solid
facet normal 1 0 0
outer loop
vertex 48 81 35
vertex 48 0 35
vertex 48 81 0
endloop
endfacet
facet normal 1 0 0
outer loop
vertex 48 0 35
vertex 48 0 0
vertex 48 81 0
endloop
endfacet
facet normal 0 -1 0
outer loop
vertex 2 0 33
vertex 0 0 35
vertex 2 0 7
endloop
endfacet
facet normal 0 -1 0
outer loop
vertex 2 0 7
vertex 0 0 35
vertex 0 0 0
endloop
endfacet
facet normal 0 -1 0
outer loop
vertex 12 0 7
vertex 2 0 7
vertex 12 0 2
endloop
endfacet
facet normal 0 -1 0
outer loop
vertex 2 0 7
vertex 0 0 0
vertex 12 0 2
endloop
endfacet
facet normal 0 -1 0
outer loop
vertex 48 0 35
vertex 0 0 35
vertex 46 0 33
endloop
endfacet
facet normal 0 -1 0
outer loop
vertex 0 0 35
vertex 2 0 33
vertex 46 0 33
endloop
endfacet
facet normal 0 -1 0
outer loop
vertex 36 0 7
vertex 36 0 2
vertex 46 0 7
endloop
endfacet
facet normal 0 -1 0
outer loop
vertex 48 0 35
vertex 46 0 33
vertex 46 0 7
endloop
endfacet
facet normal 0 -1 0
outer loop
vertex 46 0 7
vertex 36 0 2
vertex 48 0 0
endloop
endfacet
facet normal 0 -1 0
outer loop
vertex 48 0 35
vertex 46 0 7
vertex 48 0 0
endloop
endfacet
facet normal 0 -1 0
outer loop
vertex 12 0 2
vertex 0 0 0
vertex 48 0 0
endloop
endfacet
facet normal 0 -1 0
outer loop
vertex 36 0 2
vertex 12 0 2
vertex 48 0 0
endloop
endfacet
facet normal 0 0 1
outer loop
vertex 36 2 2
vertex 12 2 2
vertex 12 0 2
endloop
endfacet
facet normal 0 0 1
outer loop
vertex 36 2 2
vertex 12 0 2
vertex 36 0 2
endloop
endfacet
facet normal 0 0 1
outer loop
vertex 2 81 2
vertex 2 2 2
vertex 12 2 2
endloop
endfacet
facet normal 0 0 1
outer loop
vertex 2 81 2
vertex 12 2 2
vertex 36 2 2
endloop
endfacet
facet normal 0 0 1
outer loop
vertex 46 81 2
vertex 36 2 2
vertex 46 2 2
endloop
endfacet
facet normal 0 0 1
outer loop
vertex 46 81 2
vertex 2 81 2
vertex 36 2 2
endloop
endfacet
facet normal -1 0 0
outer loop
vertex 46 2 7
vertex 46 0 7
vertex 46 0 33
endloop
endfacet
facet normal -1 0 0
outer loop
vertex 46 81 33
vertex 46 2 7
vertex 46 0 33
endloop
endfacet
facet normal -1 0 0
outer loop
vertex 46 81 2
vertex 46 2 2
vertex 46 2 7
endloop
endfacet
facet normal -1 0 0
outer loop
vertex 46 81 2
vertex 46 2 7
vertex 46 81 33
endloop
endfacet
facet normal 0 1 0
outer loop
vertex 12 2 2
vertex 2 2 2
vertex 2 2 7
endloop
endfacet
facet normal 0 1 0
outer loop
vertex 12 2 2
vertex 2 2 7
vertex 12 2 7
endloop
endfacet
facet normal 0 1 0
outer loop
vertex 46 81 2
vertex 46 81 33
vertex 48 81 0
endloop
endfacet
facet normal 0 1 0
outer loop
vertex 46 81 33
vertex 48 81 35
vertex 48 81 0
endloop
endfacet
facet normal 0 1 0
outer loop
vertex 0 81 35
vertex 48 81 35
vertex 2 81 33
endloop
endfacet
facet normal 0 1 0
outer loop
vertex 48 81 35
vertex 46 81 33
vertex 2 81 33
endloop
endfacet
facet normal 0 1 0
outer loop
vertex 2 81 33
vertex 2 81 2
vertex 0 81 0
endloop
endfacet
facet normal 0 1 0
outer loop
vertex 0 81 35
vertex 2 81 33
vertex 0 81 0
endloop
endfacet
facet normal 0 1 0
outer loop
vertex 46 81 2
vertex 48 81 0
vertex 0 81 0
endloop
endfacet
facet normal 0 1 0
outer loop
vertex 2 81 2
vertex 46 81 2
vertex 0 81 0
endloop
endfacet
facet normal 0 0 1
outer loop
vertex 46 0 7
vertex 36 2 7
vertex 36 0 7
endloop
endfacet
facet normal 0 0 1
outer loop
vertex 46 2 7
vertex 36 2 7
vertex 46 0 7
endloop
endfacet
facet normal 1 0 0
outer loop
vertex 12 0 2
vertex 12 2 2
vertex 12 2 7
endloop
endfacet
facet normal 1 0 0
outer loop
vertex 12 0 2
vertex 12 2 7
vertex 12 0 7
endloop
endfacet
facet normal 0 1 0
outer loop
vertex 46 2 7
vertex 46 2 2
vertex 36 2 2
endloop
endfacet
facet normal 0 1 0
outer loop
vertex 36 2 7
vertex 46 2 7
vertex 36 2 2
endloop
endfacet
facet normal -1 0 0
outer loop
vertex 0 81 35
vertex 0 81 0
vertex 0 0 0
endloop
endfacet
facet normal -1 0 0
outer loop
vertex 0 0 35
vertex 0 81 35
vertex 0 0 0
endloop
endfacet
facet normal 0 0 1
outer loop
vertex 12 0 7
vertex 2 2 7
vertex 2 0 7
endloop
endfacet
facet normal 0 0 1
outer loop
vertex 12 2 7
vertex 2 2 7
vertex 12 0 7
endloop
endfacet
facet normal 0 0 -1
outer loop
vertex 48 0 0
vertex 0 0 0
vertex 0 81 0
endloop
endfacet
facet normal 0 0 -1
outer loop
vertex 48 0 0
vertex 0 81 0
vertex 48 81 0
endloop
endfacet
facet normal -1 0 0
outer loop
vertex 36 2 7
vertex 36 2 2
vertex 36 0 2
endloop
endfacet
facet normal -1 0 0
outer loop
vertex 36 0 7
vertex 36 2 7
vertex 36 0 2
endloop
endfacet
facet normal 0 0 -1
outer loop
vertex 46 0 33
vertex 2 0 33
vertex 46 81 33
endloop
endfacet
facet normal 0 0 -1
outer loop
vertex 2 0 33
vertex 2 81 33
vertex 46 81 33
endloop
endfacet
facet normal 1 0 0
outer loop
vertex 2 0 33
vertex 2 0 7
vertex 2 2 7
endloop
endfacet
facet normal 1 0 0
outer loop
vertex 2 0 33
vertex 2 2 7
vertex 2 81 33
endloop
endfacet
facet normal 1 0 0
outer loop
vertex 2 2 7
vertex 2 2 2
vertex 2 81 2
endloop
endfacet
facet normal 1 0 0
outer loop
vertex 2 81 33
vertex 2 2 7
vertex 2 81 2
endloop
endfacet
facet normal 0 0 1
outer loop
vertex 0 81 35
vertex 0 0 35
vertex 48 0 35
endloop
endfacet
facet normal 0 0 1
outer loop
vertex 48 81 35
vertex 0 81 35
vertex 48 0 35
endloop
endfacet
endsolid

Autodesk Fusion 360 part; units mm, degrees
sketch "Szkic1" plane through (0, 0, 0) normal (0, 0, 1) x (1, 0, 0)
  line L0 (0, 0) -> (48, 0)
  line L1 (48, 0) -> (48, 81)
  line L2 (48, 81) -> (0, 81)
  line L3 (0, 81) -> (0, 0)
  dimension "d1" = 48
  dimension "d2" = 81
extrude "Wyciągnięcie proste1" add sketch "Szkic1" along normal blind 2 makes body 1
ref_plane "Płaszczyzna konstrukcyjna1" through (0, 0, 2) normal (0, 0, 1) x (1, 0, 0)
sketch "Szkic2" plane through (0, 0, 2) normal (0, 0, 1) x (1, 0, 0)
  line L0 (0, 2) -> (2, 2) construction
  line L1 (0, 0) -> (48, 0)
  line L2 (48, 0) -> (48, 81)
  line L3 (48, 81) -> (0, 81)
  line L4 (0, 81) -> (0, 0)
  line L5 (2, 2) -> (12, 2)
  line L6 (12, 2) -> (12, 0)
  line L7 (12, 0) -> (2, 0)
  line L8 (2, 0) -> (2, 2)
  line L9 (46, 2) -> (36, 2)
  line L10 (36, 2) -> (36, 0)
  line L11 (36, 0) -> (46, 0)
  line L12 (46, 0) -> (46, 2)
  line L13 (0, 0) -> (2, 0)
  line L14 (2, 0) -> (2, 81)
  line L15 (2, 81) -> (0, 81)
  line L16 (0, 81) -> (0, 0)
  line L17 (48, 0) -> (46, 0)
  line L18 (46, 0) -> (46, 81)
  line L19 (46, 81) -> (48, 81)
  line L20 (48, 81) -> (48, 0)
  dimension "d8" = 44
  dimension "d10" = 48
  dimension "d11" = 81
  dimension "d12" = 10
  dimension "d13" = 2
  dimension "d16" = 10
  dimension "d19" = 81
  dimension "d22" = 81
extrude "Wyciągnięcie proste2" add sketch "Szkic2" along normal blind 5 contours L1 L5 L6 L7 L8 L14 bodies 1
extrude "Wyciągnięcie proste3" add sketch "Szkic2" along normal blind 5 contours L1 L9 L10 L11 L12 L18 bodies 1
extrude "Wyciągnięcie proste4" add sketch "Szkic2" along normal blind 31 contours L1 L3 L4 L8 L13 L14 L15 L16 bodies 1
extrude "Wyciągnięcie proste5" add sketch "Szkic2" along normal blind 31 contours L1 L2 L3 L12 L17 L18 L19 L20 bodies 1
ref_plane "Płaszczyzna konstrukcyjna2" through (0, 0, 33) normal (0, 0, 1) x (1, 0, 0)
sketch "Szkic3" plane through (0, 0, 33) normal (0, 0, 1) x (1, 0, 0)
  line L0 (0, 0) -> (48, 0)
  line L1 (48, 0) -> (48, 81)
  line L2 (48, 81) -> (0, 81)
  line L3 (0, 81) -> (0, 0)
  dimension "d26" = 48
  dimension "d27" = 81
extrude "Wyciągnięcie proste6" add sketch "Szkic3" along normal blind 2 bodies 1
copy_body "Bryła->Komponent1" bodies 1 removing the originals makes body 2 in component "Component"
component "Component" placed x (1, 0, 0) y (0, 1, 0) z (0, 0, 1) at (0, 0, 0)
